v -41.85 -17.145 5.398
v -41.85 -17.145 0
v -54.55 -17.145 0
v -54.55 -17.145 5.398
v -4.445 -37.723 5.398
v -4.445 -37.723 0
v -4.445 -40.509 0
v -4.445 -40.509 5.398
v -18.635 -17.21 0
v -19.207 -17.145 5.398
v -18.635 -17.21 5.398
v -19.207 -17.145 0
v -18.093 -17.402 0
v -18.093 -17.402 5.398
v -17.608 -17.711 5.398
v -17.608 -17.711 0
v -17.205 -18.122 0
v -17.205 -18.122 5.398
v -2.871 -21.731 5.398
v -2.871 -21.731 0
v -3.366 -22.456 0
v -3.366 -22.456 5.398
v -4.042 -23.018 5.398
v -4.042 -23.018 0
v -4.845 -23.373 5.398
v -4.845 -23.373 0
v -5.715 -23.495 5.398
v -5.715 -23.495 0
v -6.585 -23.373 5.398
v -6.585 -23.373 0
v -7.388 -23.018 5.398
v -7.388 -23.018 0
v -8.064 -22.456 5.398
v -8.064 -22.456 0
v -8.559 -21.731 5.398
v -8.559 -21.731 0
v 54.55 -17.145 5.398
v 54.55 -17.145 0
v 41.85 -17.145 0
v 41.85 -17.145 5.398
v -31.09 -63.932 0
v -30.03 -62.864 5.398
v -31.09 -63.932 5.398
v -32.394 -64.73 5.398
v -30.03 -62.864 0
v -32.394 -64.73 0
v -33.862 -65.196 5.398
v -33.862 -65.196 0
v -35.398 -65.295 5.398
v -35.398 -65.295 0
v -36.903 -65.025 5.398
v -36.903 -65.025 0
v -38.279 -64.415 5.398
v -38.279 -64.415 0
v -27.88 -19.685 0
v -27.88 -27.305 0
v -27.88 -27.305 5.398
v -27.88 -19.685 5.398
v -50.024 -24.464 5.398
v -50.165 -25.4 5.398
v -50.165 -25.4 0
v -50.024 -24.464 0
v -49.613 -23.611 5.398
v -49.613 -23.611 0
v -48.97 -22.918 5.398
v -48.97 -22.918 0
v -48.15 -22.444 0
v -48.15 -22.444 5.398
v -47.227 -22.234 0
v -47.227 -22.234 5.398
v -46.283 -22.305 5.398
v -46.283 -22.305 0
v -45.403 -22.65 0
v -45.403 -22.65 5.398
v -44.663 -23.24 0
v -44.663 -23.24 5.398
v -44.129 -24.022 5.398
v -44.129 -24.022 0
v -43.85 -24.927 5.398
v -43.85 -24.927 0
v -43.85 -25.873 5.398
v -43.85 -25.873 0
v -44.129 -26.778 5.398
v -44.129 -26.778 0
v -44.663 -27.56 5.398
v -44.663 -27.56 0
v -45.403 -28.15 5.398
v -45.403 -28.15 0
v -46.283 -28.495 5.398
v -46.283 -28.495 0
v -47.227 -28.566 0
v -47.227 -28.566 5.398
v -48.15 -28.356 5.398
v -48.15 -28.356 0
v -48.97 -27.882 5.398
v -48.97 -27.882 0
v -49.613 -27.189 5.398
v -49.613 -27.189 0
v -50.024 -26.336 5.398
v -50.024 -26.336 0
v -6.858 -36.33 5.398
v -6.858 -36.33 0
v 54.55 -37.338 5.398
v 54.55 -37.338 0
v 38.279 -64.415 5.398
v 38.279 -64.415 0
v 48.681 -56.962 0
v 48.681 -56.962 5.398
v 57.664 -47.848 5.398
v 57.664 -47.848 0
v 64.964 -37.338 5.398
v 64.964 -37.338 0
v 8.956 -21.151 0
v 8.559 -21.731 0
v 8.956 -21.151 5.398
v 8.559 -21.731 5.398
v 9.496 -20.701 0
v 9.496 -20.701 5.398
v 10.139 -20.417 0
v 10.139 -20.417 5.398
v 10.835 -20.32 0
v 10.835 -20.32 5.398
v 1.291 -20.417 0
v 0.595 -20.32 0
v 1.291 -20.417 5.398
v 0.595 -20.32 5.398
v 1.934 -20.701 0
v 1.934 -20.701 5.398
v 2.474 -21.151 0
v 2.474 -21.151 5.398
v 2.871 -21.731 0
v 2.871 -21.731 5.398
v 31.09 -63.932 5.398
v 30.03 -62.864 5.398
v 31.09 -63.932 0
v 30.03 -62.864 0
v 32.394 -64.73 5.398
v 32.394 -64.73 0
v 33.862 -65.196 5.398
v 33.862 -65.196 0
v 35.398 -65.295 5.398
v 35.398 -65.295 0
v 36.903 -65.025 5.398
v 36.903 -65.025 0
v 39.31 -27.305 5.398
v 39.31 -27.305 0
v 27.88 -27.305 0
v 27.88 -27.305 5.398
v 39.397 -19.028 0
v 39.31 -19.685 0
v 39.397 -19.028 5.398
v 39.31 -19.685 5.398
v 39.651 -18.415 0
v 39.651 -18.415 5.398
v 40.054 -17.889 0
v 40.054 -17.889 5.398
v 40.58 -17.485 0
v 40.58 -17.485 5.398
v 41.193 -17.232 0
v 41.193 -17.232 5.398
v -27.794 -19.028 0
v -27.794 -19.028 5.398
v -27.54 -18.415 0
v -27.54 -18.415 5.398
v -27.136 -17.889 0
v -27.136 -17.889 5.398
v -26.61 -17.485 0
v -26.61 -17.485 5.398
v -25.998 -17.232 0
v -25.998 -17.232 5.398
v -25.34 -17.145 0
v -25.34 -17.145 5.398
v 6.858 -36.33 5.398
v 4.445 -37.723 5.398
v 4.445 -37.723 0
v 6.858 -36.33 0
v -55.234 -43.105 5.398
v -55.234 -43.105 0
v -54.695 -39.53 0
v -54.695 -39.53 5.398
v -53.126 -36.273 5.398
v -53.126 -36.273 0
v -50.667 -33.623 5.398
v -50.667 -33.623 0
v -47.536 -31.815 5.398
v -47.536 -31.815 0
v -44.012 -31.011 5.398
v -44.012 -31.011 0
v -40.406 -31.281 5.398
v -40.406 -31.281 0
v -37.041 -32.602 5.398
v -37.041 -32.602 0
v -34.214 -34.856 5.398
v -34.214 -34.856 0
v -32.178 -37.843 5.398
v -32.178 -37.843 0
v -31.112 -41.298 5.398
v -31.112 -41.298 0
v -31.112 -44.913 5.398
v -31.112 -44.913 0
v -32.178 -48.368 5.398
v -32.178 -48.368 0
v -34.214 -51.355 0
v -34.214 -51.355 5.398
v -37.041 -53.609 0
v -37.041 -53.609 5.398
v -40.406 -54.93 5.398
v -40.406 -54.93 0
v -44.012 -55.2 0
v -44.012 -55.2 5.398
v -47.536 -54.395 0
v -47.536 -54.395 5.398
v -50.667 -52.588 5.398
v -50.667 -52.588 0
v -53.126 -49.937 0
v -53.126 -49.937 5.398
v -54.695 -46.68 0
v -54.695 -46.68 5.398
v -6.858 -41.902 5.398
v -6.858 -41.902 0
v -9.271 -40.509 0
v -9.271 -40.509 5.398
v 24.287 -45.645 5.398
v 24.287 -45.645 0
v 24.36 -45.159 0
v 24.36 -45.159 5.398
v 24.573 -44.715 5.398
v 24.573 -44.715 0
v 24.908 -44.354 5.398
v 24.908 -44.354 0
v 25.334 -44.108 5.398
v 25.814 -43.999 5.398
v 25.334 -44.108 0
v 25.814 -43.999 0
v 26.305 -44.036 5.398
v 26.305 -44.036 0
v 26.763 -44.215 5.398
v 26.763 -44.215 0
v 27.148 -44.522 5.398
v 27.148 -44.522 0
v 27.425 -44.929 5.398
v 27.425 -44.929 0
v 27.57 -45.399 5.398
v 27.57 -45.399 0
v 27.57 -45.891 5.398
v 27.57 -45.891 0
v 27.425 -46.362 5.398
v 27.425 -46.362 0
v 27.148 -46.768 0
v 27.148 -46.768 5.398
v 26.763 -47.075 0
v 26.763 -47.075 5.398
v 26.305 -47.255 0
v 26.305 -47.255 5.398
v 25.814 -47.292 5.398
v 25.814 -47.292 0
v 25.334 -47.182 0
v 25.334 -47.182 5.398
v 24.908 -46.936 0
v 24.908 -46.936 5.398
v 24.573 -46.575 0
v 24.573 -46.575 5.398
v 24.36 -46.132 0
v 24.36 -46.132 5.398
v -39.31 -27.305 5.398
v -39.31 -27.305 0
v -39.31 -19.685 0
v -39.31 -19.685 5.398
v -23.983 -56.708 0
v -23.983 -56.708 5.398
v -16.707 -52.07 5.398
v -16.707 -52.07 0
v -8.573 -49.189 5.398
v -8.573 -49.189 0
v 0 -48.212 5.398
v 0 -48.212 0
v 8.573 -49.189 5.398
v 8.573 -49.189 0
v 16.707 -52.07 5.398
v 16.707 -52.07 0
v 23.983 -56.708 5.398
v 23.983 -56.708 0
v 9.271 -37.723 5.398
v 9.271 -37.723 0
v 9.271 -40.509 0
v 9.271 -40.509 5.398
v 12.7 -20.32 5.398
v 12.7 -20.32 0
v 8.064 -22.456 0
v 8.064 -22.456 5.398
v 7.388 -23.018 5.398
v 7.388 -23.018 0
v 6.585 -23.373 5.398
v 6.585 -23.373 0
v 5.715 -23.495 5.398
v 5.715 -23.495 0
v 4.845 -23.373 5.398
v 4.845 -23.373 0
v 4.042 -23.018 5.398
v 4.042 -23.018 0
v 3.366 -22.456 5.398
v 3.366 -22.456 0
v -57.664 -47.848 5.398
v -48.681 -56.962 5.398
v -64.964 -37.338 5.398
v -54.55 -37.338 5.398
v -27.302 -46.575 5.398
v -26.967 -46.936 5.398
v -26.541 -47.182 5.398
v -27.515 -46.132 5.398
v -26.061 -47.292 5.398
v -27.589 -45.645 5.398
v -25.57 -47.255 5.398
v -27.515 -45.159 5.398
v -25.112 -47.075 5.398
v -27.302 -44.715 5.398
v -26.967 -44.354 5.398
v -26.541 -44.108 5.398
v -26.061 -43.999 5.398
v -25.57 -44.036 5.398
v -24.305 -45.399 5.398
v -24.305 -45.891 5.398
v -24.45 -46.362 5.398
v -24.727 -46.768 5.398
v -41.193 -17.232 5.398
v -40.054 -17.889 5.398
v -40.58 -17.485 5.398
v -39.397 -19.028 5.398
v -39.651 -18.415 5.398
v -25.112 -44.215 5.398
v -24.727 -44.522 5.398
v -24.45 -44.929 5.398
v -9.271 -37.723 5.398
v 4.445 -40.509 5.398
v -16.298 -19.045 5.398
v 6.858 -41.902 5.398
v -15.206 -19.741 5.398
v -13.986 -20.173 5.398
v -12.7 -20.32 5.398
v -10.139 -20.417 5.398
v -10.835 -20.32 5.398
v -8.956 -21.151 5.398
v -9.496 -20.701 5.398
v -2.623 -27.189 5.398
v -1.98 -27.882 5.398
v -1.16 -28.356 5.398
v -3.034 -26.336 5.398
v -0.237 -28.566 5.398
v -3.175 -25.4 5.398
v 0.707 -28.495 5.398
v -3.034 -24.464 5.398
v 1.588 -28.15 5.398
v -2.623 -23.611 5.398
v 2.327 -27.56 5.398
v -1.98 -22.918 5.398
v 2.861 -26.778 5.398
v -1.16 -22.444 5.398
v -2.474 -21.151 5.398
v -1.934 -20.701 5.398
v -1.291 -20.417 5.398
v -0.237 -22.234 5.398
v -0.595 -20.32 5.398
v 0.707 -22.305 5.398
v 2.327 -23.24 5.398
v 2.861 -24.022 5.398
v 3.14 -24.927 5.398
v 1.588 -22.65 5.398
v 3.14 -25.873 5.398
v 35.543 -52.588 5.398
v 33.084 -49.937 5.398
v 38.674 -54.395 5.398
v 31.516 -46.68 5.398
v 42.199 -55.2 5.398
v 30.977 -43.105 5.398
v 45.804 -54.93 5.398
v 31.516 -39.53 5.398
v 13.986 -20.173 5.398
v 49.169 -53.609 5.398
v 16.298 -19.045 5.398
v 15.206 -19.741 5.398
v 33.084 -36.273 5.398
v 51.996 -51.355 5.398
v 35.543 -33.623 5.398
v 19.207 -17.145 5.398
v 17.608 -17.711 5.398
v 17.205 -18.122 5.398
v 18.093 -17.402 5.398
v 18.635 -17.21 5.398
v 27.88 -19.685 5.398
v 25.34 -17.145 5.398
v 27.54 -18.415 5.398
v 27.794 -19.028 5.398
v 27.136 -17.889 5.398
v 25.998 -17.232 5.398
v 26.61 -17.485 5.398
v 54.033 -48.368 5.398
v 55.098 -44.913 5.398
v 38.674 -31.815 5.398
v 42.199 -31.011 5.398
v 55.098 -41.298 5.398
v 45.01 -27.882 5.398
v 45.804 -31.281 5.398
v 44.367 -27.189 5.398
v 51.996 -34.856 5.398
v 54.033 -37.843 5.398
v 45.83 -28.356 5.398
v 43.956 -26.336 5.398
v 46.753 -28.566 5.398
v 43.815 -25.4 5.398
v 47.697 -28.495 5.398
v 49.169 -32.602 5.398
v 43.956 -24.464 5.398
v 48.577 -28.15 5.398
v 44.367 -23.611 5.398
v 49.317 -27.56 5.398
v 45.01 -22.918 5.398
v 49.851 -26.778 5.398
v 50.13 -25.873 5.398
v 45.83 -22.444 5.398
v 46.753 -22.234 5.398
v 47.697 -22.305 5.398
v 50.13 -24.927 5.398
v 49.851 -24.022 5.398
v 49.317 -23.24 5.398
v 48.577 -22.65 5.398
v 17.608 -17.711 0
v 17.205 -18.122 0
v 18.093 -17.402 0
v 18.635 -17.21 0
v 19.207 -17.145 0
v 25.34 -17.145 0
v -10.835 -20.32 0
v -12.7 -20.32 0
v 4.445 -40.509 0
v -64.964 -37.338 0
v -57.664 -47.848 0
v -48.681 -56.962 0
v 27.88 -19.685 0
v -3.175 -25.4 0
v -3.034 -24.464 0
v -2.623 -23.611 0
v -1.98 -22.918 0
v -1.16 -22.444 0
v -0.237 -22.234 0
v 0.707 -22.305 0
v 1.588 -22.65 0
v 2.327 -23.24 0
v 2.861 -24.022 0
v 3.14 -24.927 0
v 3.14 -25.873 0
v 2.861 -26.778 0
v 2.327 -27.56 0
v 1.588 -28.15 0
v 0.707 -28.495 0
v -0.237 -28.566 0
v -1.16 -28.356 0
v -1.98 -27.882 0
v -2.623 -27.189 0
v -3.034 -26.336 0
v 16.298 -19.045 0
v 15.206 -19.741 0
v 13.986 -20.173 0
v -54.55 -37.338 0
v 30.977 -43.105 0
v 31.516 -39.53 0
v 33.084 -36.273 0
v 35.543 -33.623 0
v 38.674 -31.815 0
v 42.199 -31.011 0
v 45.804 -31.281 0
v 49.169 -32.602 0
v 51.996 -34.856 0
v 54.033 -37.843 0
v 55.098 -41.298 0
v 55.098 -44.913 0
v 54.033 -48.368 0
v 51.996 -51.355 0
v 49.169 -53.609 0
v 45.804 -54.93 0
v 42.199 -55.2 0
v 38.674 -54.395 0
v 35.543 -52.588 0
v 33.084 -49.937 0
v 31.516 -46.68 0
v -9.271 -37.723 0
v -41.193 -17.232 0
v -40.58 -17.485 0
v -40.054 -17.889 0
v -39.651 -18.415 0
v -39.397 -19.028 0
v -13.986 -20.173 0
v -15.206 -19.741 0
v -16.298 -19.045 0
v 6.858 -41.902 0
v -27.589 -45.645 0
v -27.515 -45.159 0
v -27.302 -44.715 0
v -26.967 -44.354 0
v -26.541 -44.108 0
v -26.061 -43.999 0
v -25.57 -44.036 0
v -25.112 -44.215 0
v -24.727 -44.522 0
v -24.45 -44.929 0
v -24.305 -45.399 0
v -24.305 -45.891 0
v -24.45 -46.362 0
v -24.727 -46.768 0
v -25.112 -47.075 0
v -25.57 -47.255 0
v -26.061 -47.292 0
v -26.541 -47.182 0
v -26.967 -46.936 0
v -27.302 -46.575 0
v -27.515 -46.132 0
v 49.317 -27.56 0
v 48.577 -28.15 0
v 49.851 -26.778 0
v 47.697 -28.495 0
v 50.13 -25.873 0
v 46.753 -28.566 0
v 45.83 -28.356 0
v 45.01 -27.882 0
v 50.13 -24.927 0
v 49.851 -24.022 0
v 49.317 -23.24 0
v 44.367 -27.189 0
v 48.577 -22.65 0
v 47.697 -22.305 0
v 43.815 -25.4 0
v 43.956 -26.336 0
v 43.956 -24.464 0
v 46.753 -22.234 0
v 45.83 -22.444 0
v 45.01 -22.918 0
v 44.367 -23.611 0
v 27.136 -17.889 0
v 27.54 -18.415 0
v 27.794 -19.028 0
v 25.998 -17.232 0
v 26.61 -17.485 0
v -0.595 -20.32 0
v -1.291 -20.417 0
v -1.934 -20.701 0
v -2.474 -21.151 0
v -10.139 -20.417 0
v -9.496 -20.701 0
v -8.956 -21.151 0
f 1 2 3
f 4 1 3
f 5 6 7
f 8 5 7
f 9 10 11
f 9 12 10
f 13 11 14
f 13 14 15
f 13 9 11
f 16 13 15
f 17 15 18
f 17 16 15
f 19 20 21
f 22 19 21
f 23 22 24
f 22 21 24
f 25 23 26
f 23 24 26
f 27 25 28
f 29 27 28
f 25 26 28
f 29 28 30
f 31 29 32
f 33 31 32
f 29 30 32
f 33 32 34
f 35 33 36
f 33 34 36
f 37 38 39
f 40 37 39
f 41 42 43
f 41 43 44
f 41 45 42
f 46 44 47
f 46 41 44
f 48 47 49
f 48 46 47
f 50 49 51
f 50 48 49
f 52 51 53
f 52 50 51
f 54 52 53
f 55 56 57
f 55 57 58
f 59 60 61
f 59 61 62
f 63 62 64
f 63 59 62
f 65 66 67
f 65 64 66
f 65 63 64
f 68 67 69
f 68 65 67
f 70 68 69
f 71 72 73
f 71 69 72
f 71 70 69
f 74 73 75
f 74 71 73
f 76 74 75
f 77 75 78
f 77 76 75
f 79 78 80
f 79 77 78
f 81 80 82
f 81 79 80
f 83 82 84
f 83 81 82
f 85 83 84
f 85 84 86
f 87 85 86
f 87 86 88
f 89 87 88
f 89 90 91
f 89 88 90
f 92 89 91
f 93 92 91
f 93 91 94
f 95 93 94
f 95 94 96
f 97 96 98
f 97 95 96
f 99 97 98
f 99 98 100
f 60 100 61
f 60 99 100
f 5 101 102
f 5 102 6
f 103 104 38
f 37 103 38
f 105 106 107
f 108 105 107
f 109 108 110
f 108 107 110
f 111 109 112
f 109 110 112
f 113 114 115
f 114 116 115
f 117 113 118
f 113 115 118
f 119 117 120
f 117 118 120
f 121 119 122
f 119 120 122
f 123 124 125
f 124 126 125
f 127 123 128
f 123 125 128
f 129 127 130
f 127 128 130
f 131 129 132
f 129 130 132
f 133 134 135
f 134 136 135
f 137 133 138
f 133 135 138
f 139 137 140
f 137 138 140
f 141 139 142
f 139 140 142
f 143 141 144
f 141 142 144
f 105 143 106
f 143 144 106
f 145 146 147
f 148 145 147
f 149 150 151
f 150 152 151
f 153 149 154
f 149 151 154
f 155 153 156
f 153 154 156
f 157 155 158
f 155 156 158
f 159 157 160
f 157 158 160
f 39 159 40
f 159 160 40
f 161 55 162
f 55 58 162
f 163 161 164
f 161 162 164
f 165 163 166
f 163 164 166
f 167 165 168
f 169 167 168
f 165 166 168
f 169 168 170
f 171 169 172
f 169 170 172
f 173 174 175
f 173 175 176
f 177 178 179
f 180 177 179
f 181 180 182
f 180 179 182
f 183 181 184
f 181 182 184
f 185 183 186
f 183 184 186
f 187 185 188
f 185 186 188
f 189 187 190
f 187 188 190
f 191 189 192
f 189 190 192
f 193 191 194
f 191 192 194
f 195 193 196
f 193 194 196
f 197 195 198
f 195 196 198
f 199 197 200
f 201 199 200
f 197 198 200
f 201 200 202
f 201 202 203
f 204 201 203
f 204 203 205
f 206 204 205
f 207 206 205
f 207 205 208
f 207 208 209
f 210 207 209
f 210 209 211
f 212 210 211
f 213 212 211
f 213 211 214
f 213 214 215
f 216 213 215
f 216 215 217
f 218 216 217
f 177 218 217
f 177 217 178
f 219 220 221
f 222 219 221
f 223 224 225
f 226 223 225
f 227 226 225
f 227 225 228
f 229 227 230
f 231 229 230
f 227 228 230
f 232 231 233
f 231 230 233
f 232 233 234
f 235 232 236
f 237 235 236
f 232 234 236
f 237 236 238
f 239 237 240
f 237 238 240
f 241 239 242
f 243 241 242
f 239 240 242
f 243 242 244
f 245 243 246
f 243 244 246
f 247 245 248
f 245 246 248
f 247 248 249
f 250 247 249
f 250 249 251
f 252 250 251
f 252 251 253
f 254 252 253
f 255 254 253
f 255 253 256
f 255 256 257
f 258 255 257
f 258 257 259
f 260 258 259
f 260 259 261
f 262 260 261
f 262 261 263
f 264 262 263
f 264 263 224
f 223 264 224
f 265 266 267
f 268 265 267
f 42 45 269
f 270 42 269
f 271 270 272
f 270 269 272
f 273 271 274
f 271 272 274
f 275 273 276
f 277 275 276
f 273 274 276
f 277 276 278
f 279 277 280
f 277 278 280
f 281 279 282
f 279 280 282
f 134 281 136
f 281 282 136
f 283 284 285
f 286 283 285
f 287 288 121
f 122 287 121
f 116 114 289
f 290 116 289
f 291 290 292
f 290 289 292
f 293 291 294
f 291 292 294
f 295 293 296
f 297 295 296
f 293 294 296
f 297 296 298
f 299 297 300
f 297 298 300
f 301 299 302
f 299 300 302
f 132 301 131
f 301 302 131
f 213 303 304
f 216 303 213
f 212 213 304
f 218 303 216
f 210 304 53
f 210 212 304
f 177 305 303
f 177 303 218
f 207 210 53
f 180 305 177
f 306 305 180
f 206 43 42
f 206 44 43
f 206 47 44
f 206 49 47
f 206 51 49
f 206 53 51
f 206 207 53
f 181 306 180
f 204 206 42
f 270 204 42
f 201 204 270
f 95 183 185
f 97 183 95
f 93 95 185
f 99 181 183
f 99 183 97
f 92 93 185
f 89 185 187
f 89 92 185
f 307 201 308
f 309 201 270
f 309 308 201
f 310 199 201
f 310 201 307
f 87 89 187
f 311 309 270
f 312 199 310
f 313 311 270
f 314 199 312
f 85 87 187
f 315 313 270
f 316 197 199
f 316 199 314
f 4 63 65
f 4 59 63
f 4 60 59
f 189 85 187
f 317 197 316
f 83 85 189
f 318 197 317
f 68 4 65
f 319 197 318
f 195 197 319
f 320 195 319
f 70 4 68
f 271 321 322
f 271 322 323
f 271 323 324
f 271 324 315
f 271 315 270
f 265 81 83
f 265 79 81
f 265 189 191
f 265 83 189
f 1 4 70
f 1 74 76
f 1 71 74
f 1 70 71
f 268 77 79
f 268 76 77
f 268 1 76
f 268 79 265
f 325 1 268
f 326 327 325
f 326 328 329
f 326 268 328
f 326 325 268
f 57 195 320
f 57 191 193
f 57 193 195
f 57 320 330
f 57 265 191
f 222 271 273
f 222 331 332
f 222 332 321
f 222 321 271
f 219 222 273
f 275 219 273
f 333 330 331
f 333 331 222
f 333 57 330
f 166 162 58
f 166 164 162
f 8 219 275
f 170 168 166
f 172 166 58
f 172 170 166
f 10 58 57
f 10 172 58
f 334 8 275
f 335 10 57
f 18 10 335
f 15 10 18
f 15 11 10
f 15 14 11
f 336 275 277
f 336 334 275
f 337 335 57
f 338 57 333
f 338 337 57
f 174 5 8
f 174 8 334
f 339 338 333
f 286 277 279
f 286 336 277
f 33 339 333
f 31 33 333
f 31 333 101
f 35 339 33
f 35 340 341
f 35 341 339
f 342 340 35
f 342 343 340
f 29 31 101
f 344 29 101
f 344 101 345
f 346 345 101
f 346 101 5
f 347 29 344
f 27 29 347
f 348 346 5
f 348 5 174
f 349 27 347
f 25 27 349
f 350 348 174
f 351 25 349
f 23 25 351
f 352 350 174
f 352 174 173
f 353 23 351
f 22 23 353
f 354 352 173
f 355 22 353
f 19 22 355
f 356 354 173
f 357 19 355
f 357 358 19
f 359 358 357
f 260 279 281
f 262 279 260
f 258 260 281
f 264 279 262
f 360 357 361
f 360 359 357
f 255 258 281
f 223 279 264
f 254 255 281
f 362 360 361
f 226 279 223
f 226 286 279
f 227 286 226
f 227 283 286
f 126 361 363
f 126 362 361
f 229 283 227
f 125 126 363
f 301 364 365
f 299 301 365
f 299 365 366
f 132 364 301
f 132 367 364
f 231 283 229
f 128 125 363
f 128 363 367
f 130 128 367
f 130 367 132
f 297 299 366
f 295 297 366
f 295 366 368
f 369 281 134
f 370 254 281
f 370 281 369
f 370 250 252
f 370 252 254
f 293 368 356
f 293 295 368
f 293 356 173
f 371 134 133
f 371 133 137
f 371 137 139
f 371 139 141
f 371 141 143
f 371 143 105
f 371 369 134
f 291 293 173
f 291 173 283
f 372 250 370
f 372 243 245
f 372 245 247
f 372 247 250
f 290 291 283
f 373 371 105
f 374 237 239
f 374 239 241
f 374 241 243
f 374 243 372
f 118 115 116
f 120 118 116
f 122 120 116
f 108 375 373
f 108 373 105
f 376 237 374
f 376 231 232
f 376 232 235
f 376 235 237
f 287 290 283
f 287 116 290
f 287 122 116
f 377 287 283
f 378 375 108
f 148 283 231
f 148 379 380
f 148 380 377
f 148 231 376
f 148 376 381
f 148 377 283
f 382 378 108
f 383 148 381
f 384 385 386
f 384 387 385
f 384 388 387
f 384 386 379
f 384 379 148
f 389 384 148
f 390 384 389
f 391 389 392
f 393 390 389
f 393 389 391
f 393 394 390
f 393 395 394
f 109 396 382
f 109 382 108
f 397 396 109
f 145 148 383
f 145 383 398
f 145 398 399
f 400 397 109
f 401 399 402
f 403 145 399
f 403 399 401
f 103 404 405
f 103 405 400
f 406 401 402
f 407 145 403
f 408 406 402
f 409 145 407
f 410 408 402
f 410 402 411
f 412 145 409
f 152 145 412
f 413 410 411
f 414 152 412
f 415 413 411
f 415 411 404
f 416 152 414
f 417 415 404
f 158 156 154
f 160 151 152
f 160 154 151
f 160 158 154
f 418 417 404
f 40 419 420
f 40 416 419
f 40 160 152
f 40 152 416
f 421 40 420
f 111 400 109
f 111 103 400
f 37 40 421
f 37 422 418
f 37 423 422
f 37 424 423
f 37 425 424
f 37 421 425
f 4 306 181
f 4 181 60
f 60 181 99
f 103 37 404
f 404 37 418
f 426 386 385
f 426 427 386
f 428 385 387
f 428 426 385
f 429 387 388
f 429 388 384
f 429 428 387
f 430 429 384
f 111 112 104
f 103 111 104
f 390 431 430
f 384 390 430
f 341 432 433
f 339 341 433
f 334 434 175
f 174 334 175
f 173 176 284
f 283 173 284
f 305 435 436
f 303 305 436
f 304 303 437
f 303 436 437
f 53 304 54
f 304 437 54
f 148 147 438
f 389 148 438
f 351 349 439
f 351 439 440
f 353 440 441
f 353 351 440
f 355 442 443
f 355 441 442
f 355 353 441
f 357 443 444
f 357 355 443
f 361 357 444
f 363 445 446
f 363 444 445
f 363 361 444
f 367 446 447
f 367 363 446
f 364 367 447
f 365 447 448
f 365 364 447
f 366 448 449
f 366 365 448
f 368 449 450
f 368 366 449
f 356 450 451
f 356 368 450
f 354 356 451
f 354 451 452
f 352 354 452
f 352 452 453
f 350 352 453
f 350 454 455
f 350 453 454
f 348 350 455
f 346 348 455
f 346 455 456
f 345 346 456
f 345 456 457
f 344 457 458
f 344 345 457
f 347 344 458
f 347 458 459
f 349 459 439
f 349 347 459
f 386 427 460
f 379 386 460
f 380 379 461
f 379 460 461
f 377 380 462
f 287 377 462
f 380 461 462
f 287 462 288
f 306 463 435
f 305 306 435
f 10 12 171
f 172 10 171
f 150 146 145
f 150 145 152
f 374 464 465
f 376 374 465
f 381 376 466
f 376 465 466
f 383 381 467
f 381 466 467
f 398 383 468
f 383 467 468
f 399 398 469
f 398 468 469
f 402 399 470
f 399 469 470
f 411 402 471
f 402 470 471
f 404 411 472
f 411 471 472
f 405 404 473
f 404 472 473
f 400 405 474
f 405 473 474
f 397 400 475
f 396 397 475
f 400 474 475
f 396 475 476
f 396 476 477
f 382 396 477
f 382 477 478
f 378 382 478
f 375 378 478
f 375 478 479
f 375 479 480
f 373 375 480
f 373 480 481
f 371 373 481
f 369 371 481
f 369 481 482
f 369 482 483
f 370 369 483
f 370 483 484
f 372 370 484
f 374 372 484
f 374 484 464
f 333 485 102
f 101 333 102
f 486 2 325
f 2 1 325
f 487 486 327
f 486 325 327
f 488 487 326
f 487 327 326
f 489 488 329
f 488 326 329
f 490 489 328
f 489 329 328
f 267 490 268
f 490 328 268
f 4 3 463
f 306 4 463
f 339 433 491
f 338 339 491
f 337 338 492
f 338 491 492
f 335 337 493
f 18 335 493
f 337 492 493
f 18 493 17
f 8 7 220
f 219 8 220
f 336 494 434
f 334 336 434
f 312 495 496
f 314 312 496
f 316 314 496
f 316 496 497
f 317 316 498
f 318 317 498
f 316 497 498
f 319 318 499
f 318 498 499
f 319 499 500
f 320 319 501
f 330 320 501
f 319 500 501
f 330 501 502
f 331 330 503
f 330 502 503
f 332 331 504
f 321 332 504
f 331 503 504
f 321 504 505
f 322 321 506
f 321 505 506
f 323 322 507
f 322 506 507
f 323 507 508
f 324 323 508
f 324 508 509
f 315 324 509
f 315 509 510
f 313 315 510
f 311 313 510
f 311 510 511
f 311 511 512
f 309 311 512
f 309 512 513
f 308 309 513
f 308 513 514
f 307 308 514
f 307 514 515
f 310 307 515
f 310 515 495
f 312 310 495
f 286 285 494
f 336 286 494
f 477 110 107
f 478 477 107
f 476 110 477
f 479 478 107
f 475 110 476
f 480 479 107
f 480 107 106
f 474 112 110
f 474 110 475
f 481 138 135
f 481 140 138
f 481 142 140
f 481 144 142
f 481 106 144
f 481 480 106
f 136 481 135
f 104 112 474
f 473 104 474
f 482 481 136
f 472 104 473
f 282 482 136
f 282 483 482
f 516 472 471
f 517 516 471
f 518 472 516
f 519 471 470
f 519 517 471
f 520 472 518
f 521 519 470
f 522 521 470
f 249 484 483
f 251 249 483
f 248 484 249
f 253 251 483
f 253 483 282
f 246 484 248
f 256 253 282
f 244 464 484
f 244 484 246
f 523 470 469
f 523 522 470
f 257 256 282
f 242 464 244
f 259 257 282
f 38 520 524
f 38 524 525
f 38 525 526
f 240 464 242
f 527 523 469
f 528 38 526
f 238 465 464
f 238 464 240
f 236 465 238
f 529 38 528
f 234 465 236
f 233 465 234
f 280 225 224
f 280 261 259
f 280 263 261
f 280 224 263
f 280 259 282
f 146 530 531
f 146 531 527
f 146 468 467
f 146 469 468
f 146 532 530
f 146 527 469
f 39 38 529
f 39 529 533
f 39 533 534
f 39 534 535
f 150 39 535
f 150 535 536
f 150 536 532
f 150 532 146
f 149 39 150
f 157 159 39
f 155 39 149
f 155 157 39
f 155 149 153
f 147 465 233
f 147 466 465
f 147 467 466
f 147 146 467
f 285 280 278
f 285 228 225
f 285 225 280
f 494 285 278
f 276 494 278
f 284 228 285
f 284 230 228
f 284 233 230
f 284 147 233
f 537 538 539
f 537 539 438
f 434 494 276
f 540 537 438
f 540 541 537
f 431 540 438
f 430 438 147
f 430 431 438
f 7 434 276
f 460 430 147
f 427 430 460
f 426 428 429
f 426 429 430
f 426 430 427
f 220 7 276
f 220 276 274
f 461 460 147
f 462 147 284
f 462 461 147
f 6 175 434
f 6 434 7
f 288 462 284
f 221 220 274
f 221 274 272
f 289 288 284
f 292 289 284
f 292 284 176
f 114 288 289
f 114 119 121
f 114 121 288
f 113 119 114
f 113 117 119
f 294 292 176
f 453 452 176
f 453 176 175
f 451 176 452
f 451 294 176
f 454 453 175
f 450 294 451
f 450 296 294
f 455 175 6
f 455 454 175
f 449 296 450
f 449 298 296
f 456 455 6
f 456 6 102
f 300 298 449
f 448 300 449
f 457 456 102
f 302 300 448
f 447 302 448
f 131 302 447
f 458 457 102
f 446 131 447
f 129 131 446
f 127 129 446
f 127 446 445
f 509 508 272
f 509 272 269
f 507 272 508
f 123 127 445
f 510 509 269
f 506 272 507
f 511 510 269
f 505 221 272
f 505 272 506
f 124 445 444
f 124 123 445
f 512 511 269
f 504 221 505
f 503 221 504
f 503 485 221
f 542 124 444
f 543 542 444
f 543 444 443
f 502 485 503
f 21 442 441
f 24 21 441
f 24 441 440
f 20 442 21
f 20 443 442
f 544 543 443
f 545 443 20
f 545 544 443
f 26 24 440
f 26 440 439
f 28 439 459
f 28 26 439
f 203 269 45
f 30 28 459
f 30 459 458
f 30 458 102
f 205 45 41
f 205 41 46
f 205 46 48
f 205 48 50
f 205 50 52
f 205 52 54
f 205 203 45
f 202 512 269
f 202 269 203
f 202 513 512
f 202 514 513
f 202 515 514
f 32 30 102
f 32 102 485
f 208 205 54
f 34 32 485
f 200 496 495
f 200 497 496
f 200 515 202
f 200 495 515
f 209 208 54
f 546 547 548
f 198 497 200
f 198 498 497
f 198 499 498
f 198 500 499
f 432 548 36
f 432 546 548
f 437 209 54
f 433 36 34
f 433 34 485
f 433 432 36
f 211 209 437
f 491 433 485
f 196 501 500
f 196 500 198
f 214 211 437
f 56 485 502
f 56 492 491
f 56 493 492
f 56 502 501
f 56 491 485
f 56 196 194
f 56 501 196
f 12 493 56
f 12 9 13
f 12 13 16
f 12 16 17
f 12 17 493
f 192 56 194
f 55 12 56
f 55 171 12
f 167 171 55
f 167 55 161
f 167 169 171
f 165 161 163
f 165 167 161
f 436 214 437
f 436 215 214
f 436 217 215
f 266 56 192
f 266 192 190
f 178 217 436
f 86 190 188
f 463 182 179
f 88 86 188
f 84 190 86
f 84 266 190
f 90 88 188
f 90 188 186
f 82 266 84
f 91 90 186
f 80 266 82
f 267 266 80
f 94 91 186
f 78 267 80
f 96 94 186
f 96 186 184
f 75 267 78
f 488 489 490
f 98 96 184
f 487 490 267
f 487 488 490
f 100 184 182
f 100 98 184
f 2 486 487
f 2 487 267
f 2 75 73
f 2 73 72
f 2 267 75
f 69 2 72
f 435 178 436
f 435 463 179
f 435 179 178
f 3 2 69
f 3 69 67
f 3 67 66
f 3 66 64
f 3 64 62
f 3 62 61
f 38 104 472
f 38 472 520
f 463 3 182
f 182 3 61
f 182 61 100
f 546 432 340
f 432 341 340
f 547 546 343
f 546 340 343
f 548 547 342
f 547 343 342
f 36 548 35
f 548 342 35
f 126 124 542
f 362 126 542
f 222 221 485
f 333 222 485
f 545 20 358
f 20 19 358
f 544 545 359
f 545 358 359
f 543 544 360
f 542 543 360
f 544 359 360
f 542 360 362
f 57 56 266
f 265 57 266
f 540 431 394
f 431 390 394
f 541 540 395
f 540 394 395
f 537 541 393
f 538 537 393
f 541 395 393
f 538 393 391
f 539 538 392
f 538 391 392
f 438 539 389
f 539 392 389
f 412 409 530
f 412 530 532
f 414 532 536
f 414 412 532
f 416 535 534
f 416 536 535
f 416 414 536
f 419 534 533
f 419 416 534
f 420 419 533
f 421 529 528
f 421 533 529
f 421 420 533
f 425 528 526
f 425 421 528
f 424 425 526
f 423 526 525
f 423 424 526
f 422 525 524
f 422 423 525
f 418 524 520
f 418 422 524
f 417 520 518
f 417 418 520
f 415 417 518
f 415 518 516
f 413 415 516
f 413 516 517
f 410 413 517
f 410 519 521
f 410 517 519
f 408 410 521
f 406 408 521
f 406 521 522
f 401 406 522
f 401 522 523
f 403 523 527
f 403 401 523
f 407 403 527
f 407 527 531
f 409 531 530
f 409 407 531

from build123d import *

# Parameters (mm, degrees)
SKETCH1_R                 = 1.651
BOSS_EXTRUDE2_DEPTH       = 5.3975
SKETCH2_R                 = 1.143
CUT_EXTRUDE1_DEPTH        = 6.3975
SKETCH3_R                 = 12.1285
CUT_EXTRUDE2_DEPTH        = 6.3975
SKETCH4_W                 = 28.562713242
SKETCH4_H                 = 11.677503754
BOSS_EXTRUDE3_DEPTH       = 5.3975
SKETCH5_W                 = 216.7214489
SKETCH5_H                 = 130.569220634
CUT_EXTRUDE4_DEPTH        = 6.3975
SKETCH6_R                 = 38.1
CUT_EXTRUDE5_DEPTH        = 60.96
FILLET1_R                 = 6.35
FILLET2_R                 = 6.35
SKETCH102_W               = 11.43
SKETCH102_H               = 10.16
CUT_EXTRUDE101_DEPTH      = 6.3975001
SKETCH158_R               = 1.651
CUT_EXTRUDE157_DEPTH      = 97.79
SKETCH212_R               = 3.175
CUT_EXTRUDE211_DEPTH      = 103.378
CUT_EXTRUDE211_DEPTH_BACK = 48.768
CUT_EXTRUDE104_DEPTH      = 10
FILLET3_R                 = 2.54
SKETCH225_R               = 12.1285
BOSS_EXTRUDE4_DEPTH       = 5.3975
CUT_EXTRUDE224_DEPTH      = 6.3975001


with BuildPart() as part:
    # Sketch1 → Boss-Extrude2 (new body)
    with BuildSketch(Plane.XY):
        with BuildLine():
            Line((-64.964441474, 37.338), (-54.550441474, 37.338))
            Line((-54.550441474, 37.338), (-54.550441474, -37.338))
            Line((-54.550441474, -37.338), (-64.964441474, -37.338))
            ThreePointArc((-64.964441474, -37.338), (0, -74.93), (64.964441474, -37.338))
            Line((64.964441474, -37.338), (54.550441474, -37.338))
            Line((54.550441474, -37.338), (54.550441474, 37.338))
            Line((54.550441474, 37.338), (64.964441474, 37.338))
            ThreePointArc((64.964441474, 37.338), (0, 74.93), (-64.964441474, 37.338))
        make_face()
        with Locations((-46.482, 11.049)):
            Circle(SKETCH1_R, mode=Mode.SUBTRACT)
        with Locations((-21.083270032, 10.795)):
            Circle(SKETCH1_R, mode=Mode.SUBTRACT)
        with Locations((-21.083270032, -10.795)):
            Circle(SKETCH1_R, mode=Mode.SUBTRACT)
        with Locations((-46.482, -11.049)):
            Circle(SKETCH1_R, mode=Mode.SUBTRACT)
        with Locations((46.482, -11.049)):
            Circle(SKETCH1_R, mode=Mode.SUBTRACT)
        with Locations((21.083270032, -10.795)):
            Circle(SKETCH1_R, mode=Mode.SUBTRACT)
        with Locations((21.083270032, 10.795)):
            Circle(SKETCH1_R, mode=Mode.SUBTRACT)
        with Locations((46.482, 11.049)):
            Circle(SKETCH1_R, mode=Mode.SUBTRACT)
    extrude(amount=BOSS_EXTRUDE2_DEPTH)

    # Sketch2 → Cut-Extrude1 (cut, through all)
    with BuildSketch(Plane.XY.offset(5.3975)):
        with Locations((-6.731, 62.23)):
            Circle(SKETCH2_R)
        with Locations((6.731, 62.23)):
            Circle(SKETCH2_R)
    extrude(amount=-CUT_EXTRUDE1_DEPTH, mode=Mode.SUBTRACT)

    # Sketch3 → Cut-Extrude2 (cut, through all)
    with BuildSketch(Plane(origin=(0, 0, 0), x_dir=(-1, 0, 0), z_dir=(0, 0, -1))):
        with Locations((-43.105229381, -43.105229381)):
            Circle(SKETCH3_R)
        with Locations((14.224, -34.29)):
            Circle(SKETCH3_R)
        with Locations((14.224, 34.29)):
            Circle(SKETCH3_R)
        with Locations((-43.105229381, 43.105229381)):
            Circle(SKETCH3_R)
        with Locations((43.105229381, 43.105229381)):
            Circle(SKETCH3_R)
        with Locations((-14.224, 34.29)):
            Circle(SKETCH3_R)
        with Locations((-14.224, -34.29)):
            Circle(SKETCH3_R)
        with Locations((43.105229381, -43.105229381)):
            Circle(SKETCH3_R)
    extrude(amount=-CUT_EXTRUDE2_DEPTH, mode=Mode.SUBTRACT)

    # Sketch4 → Boss-Extrude3 (add)
    with BuildSketch(Plane(origin=(0, 0, 0), x_dir=(-1, 0, 0), z_dir=(0, 0, -1))):
        with Locations((-1.488809975, 62.152540216)):
            Rectangle(SKETCH4_W, SKETCH4_H)
    extrude(amount=-BOSS_EXTRUDE3_DEPTH)

    # Sketch5 → Cut-Extrude4 (cut, through all)
    with BuildSketch(Plane(origin=(0, 0, 0), x_dir=(-1, 0, 0), z_dir=(0, 0, -1))):
        with Locations((23.316688373, 48.139610317)):
            Rectangle(SKETCH5_W, SKETCH5_H)
    extrude(amount=-CUT_EXTRUDE4_DEPTH, mode=Mode.SUBTRACT)

    # Sketch6 → Cut-Extrude5 (cut)
    with BuildSketch(Plane(origin=(0, 0, 0), x_dir=(-1, 0, 0), z_dir=(0, 0, -1))):
        with Locations((0, -86.312058398)):
            Circle(SKETCH6_R)
    extrude(amount=-CUT_EXTRUDE5_DEPTH, mode=Mode.SUBTRACT)

    # Fillet1
    fillet1_edges = [part.edges().sort_by_distance(p)[0] for p in [
        (-33.000960548, -67.271401821, 2.69875),
    ]]
    fillet(fillet1_edges, radius=FILLET1_R)

    # Fillet2
    fillet2_edges = [part.edges().sort_by_distance(p)[0] for p in [
        (33.000960548, -67.271401821, 2.69875),
    ]]
    fillet(fillet2_edges, radius=FILLET2_R)

    # Sketch102 → Cut-Extrude101 (cut, through all)
    with BuildSketch(Plane(origin=(0, 0, 0), x_dir=(-1, 0, 0), z_dir=(0, 0, -1))):
        with Locations((-33.595441474, -22.225)):
            Rectangle(SKETCH102_W, SKETCH102_H)
        with Locations((33.595441474, -22.225)):
            Rectangle(SKETCH102_W, SKETCH102_H)
    extrude(amount=-CUT_EXTRUDE101_DEPTH, mode=Mode.SUBTRACT)

    # Sketch158 → Cut-Extrude157 (cut)
    with BuildSketch(Plane(origin=(30.092005081, 4.08352975, -24.638), x_dir=(-1, 0, 0), z_dir=(0, 0, -1))):
        with Locations((4.154396091, -49.728759131)):
            Circle(SKETCH158_R)
        with Locations((56.02961407, -49.728759131)):
            Circle(SKETCH158_R)
    extrude(amount=-CUT_EXTRUDE157_DEPTH, mode=Mode.SUBTRACT)

    # Sketch212 → Cut-Extrude211 (cut, two sides)
    with BuildSketch(Plane(origin=(30.092005081, 4.08352975, 11.4935), x_dir=(-1, 0, 0), z_dir=(0, 0, -1))) as cut_extrude211_sk:
        with Locations((77.082005081, -29.48352975)):
            Circle(SKETCH212_R)
        with Locations((30.092005081, -29.48352975)):
            Circle(SKETCH212_R)
        with Locations((-16.897994919, -29.48352975)):
            Circle(SKETCH212_R)
    extrude(amount=CUT_EXTRUDE211_DEPTH, mode=Mode.SUBTRACT)
    extrude(cut_extrude211_sk.sketch, amount=-CUT_EXTRUDE211_DEPTH_BACK, mode=Mode.SUBTRACT)

    # Sketch105 → Cut-Extrude104 (cut)
    with BuildSketch(Plane(origin=(0, 0, 0), x_dir=(-1, 0, 0), z_dir=(0, 0, -1))):
        with BuildLine():
            Line((-12.7, -20.32), (-8.89, -20.32))
            ThreePointArc((-8.89, -20.32), (-5.715, -23.495), (-2.54, -20.32))
            Line((-2.54, -20.32), (2.54, -20.32))
            ThreePointArc((2.54, -20.32), (5.715, -23.495), (8.89, -20.32))
            Line((8.89, -20.32), (12.7, -20.32))
            ThreePointArc((12.7, -20.32), (18.415, -14.605), (12.7, -8.89))
            Line((12.7, -8.89), (-12.7, -8.89))
            ThreePointArc((-12.7, -8.89), (-18.415, -14.605), (-12.7, -20.32))
        make_face()
    extrude(amount=-CUT_EXTRUDE104_DEPTH, mode=Mode.SUBTRACT)

    # Fillet3
    fillet3_edges = [part.edges().sort_by_distance(p)[0] for p in [
        (39.310441474, -17.145, 2.69875),
        (27.880441474, -17.145, 2.69875),
        (-27.880441474, -17.145, 2.69875),
        (-39.310441474, -17.145, 2.69875),
        (17.81953367, -17.145, 2.69875),
        (-17.81953367, -17.145, 2.69875),
        (-8.89, -20.32, 2.69875),
        (-2.54, -20.32, 2.69875),
        (2.54, -20.32, 2.69875),
        (8.89, -20.32, 2.69875),
    ]]
    fillet(fillet3_edges, radius=FILLET3_R)

    # Sketch225 → Boss-Extrude4 (add)
    with BuildSketch(Plane(origin=(0, 0, 0), x_dir=(-1, 0, 0), z_dir=(0, 0, -1))):
        with Locations((-14.224, -34.29)):
            Circle(SKETCH225_R)
        with Locations((14.224, -34.29)):
            Circle(SKETCH225_R)
    extrude(amount=-BOSS_EXTRUDE4_DEPTH)

    # Sketch226 → Cut-Extrude224 (cut, through all)
    with BuildSketch(Plane(origin=(0, 0, 0), x_dir=(-1, 0, 0), z_dir=(0, 0, -1))):
        Polygon((4.445, -37.7228538), (4.445, -40.5091462), (6.858, -41.902292399), (9.271, -40.5091462), (9.271, -37.7228538), (6.858, -36.329707601), align=None)
        Polygon((-4.445, -37.7228538), (-6.858, -36.329707601), (-9.271, -37.7228538), (-9.271, -40.5091462), (-6.858, -41.902292399), (-4.445, -40.5091462), align=None)
    extrude(amount=-CUT_EXTRUDE224_DEPTH, mode=Mode.SUBTRACT)


solid = part.part
